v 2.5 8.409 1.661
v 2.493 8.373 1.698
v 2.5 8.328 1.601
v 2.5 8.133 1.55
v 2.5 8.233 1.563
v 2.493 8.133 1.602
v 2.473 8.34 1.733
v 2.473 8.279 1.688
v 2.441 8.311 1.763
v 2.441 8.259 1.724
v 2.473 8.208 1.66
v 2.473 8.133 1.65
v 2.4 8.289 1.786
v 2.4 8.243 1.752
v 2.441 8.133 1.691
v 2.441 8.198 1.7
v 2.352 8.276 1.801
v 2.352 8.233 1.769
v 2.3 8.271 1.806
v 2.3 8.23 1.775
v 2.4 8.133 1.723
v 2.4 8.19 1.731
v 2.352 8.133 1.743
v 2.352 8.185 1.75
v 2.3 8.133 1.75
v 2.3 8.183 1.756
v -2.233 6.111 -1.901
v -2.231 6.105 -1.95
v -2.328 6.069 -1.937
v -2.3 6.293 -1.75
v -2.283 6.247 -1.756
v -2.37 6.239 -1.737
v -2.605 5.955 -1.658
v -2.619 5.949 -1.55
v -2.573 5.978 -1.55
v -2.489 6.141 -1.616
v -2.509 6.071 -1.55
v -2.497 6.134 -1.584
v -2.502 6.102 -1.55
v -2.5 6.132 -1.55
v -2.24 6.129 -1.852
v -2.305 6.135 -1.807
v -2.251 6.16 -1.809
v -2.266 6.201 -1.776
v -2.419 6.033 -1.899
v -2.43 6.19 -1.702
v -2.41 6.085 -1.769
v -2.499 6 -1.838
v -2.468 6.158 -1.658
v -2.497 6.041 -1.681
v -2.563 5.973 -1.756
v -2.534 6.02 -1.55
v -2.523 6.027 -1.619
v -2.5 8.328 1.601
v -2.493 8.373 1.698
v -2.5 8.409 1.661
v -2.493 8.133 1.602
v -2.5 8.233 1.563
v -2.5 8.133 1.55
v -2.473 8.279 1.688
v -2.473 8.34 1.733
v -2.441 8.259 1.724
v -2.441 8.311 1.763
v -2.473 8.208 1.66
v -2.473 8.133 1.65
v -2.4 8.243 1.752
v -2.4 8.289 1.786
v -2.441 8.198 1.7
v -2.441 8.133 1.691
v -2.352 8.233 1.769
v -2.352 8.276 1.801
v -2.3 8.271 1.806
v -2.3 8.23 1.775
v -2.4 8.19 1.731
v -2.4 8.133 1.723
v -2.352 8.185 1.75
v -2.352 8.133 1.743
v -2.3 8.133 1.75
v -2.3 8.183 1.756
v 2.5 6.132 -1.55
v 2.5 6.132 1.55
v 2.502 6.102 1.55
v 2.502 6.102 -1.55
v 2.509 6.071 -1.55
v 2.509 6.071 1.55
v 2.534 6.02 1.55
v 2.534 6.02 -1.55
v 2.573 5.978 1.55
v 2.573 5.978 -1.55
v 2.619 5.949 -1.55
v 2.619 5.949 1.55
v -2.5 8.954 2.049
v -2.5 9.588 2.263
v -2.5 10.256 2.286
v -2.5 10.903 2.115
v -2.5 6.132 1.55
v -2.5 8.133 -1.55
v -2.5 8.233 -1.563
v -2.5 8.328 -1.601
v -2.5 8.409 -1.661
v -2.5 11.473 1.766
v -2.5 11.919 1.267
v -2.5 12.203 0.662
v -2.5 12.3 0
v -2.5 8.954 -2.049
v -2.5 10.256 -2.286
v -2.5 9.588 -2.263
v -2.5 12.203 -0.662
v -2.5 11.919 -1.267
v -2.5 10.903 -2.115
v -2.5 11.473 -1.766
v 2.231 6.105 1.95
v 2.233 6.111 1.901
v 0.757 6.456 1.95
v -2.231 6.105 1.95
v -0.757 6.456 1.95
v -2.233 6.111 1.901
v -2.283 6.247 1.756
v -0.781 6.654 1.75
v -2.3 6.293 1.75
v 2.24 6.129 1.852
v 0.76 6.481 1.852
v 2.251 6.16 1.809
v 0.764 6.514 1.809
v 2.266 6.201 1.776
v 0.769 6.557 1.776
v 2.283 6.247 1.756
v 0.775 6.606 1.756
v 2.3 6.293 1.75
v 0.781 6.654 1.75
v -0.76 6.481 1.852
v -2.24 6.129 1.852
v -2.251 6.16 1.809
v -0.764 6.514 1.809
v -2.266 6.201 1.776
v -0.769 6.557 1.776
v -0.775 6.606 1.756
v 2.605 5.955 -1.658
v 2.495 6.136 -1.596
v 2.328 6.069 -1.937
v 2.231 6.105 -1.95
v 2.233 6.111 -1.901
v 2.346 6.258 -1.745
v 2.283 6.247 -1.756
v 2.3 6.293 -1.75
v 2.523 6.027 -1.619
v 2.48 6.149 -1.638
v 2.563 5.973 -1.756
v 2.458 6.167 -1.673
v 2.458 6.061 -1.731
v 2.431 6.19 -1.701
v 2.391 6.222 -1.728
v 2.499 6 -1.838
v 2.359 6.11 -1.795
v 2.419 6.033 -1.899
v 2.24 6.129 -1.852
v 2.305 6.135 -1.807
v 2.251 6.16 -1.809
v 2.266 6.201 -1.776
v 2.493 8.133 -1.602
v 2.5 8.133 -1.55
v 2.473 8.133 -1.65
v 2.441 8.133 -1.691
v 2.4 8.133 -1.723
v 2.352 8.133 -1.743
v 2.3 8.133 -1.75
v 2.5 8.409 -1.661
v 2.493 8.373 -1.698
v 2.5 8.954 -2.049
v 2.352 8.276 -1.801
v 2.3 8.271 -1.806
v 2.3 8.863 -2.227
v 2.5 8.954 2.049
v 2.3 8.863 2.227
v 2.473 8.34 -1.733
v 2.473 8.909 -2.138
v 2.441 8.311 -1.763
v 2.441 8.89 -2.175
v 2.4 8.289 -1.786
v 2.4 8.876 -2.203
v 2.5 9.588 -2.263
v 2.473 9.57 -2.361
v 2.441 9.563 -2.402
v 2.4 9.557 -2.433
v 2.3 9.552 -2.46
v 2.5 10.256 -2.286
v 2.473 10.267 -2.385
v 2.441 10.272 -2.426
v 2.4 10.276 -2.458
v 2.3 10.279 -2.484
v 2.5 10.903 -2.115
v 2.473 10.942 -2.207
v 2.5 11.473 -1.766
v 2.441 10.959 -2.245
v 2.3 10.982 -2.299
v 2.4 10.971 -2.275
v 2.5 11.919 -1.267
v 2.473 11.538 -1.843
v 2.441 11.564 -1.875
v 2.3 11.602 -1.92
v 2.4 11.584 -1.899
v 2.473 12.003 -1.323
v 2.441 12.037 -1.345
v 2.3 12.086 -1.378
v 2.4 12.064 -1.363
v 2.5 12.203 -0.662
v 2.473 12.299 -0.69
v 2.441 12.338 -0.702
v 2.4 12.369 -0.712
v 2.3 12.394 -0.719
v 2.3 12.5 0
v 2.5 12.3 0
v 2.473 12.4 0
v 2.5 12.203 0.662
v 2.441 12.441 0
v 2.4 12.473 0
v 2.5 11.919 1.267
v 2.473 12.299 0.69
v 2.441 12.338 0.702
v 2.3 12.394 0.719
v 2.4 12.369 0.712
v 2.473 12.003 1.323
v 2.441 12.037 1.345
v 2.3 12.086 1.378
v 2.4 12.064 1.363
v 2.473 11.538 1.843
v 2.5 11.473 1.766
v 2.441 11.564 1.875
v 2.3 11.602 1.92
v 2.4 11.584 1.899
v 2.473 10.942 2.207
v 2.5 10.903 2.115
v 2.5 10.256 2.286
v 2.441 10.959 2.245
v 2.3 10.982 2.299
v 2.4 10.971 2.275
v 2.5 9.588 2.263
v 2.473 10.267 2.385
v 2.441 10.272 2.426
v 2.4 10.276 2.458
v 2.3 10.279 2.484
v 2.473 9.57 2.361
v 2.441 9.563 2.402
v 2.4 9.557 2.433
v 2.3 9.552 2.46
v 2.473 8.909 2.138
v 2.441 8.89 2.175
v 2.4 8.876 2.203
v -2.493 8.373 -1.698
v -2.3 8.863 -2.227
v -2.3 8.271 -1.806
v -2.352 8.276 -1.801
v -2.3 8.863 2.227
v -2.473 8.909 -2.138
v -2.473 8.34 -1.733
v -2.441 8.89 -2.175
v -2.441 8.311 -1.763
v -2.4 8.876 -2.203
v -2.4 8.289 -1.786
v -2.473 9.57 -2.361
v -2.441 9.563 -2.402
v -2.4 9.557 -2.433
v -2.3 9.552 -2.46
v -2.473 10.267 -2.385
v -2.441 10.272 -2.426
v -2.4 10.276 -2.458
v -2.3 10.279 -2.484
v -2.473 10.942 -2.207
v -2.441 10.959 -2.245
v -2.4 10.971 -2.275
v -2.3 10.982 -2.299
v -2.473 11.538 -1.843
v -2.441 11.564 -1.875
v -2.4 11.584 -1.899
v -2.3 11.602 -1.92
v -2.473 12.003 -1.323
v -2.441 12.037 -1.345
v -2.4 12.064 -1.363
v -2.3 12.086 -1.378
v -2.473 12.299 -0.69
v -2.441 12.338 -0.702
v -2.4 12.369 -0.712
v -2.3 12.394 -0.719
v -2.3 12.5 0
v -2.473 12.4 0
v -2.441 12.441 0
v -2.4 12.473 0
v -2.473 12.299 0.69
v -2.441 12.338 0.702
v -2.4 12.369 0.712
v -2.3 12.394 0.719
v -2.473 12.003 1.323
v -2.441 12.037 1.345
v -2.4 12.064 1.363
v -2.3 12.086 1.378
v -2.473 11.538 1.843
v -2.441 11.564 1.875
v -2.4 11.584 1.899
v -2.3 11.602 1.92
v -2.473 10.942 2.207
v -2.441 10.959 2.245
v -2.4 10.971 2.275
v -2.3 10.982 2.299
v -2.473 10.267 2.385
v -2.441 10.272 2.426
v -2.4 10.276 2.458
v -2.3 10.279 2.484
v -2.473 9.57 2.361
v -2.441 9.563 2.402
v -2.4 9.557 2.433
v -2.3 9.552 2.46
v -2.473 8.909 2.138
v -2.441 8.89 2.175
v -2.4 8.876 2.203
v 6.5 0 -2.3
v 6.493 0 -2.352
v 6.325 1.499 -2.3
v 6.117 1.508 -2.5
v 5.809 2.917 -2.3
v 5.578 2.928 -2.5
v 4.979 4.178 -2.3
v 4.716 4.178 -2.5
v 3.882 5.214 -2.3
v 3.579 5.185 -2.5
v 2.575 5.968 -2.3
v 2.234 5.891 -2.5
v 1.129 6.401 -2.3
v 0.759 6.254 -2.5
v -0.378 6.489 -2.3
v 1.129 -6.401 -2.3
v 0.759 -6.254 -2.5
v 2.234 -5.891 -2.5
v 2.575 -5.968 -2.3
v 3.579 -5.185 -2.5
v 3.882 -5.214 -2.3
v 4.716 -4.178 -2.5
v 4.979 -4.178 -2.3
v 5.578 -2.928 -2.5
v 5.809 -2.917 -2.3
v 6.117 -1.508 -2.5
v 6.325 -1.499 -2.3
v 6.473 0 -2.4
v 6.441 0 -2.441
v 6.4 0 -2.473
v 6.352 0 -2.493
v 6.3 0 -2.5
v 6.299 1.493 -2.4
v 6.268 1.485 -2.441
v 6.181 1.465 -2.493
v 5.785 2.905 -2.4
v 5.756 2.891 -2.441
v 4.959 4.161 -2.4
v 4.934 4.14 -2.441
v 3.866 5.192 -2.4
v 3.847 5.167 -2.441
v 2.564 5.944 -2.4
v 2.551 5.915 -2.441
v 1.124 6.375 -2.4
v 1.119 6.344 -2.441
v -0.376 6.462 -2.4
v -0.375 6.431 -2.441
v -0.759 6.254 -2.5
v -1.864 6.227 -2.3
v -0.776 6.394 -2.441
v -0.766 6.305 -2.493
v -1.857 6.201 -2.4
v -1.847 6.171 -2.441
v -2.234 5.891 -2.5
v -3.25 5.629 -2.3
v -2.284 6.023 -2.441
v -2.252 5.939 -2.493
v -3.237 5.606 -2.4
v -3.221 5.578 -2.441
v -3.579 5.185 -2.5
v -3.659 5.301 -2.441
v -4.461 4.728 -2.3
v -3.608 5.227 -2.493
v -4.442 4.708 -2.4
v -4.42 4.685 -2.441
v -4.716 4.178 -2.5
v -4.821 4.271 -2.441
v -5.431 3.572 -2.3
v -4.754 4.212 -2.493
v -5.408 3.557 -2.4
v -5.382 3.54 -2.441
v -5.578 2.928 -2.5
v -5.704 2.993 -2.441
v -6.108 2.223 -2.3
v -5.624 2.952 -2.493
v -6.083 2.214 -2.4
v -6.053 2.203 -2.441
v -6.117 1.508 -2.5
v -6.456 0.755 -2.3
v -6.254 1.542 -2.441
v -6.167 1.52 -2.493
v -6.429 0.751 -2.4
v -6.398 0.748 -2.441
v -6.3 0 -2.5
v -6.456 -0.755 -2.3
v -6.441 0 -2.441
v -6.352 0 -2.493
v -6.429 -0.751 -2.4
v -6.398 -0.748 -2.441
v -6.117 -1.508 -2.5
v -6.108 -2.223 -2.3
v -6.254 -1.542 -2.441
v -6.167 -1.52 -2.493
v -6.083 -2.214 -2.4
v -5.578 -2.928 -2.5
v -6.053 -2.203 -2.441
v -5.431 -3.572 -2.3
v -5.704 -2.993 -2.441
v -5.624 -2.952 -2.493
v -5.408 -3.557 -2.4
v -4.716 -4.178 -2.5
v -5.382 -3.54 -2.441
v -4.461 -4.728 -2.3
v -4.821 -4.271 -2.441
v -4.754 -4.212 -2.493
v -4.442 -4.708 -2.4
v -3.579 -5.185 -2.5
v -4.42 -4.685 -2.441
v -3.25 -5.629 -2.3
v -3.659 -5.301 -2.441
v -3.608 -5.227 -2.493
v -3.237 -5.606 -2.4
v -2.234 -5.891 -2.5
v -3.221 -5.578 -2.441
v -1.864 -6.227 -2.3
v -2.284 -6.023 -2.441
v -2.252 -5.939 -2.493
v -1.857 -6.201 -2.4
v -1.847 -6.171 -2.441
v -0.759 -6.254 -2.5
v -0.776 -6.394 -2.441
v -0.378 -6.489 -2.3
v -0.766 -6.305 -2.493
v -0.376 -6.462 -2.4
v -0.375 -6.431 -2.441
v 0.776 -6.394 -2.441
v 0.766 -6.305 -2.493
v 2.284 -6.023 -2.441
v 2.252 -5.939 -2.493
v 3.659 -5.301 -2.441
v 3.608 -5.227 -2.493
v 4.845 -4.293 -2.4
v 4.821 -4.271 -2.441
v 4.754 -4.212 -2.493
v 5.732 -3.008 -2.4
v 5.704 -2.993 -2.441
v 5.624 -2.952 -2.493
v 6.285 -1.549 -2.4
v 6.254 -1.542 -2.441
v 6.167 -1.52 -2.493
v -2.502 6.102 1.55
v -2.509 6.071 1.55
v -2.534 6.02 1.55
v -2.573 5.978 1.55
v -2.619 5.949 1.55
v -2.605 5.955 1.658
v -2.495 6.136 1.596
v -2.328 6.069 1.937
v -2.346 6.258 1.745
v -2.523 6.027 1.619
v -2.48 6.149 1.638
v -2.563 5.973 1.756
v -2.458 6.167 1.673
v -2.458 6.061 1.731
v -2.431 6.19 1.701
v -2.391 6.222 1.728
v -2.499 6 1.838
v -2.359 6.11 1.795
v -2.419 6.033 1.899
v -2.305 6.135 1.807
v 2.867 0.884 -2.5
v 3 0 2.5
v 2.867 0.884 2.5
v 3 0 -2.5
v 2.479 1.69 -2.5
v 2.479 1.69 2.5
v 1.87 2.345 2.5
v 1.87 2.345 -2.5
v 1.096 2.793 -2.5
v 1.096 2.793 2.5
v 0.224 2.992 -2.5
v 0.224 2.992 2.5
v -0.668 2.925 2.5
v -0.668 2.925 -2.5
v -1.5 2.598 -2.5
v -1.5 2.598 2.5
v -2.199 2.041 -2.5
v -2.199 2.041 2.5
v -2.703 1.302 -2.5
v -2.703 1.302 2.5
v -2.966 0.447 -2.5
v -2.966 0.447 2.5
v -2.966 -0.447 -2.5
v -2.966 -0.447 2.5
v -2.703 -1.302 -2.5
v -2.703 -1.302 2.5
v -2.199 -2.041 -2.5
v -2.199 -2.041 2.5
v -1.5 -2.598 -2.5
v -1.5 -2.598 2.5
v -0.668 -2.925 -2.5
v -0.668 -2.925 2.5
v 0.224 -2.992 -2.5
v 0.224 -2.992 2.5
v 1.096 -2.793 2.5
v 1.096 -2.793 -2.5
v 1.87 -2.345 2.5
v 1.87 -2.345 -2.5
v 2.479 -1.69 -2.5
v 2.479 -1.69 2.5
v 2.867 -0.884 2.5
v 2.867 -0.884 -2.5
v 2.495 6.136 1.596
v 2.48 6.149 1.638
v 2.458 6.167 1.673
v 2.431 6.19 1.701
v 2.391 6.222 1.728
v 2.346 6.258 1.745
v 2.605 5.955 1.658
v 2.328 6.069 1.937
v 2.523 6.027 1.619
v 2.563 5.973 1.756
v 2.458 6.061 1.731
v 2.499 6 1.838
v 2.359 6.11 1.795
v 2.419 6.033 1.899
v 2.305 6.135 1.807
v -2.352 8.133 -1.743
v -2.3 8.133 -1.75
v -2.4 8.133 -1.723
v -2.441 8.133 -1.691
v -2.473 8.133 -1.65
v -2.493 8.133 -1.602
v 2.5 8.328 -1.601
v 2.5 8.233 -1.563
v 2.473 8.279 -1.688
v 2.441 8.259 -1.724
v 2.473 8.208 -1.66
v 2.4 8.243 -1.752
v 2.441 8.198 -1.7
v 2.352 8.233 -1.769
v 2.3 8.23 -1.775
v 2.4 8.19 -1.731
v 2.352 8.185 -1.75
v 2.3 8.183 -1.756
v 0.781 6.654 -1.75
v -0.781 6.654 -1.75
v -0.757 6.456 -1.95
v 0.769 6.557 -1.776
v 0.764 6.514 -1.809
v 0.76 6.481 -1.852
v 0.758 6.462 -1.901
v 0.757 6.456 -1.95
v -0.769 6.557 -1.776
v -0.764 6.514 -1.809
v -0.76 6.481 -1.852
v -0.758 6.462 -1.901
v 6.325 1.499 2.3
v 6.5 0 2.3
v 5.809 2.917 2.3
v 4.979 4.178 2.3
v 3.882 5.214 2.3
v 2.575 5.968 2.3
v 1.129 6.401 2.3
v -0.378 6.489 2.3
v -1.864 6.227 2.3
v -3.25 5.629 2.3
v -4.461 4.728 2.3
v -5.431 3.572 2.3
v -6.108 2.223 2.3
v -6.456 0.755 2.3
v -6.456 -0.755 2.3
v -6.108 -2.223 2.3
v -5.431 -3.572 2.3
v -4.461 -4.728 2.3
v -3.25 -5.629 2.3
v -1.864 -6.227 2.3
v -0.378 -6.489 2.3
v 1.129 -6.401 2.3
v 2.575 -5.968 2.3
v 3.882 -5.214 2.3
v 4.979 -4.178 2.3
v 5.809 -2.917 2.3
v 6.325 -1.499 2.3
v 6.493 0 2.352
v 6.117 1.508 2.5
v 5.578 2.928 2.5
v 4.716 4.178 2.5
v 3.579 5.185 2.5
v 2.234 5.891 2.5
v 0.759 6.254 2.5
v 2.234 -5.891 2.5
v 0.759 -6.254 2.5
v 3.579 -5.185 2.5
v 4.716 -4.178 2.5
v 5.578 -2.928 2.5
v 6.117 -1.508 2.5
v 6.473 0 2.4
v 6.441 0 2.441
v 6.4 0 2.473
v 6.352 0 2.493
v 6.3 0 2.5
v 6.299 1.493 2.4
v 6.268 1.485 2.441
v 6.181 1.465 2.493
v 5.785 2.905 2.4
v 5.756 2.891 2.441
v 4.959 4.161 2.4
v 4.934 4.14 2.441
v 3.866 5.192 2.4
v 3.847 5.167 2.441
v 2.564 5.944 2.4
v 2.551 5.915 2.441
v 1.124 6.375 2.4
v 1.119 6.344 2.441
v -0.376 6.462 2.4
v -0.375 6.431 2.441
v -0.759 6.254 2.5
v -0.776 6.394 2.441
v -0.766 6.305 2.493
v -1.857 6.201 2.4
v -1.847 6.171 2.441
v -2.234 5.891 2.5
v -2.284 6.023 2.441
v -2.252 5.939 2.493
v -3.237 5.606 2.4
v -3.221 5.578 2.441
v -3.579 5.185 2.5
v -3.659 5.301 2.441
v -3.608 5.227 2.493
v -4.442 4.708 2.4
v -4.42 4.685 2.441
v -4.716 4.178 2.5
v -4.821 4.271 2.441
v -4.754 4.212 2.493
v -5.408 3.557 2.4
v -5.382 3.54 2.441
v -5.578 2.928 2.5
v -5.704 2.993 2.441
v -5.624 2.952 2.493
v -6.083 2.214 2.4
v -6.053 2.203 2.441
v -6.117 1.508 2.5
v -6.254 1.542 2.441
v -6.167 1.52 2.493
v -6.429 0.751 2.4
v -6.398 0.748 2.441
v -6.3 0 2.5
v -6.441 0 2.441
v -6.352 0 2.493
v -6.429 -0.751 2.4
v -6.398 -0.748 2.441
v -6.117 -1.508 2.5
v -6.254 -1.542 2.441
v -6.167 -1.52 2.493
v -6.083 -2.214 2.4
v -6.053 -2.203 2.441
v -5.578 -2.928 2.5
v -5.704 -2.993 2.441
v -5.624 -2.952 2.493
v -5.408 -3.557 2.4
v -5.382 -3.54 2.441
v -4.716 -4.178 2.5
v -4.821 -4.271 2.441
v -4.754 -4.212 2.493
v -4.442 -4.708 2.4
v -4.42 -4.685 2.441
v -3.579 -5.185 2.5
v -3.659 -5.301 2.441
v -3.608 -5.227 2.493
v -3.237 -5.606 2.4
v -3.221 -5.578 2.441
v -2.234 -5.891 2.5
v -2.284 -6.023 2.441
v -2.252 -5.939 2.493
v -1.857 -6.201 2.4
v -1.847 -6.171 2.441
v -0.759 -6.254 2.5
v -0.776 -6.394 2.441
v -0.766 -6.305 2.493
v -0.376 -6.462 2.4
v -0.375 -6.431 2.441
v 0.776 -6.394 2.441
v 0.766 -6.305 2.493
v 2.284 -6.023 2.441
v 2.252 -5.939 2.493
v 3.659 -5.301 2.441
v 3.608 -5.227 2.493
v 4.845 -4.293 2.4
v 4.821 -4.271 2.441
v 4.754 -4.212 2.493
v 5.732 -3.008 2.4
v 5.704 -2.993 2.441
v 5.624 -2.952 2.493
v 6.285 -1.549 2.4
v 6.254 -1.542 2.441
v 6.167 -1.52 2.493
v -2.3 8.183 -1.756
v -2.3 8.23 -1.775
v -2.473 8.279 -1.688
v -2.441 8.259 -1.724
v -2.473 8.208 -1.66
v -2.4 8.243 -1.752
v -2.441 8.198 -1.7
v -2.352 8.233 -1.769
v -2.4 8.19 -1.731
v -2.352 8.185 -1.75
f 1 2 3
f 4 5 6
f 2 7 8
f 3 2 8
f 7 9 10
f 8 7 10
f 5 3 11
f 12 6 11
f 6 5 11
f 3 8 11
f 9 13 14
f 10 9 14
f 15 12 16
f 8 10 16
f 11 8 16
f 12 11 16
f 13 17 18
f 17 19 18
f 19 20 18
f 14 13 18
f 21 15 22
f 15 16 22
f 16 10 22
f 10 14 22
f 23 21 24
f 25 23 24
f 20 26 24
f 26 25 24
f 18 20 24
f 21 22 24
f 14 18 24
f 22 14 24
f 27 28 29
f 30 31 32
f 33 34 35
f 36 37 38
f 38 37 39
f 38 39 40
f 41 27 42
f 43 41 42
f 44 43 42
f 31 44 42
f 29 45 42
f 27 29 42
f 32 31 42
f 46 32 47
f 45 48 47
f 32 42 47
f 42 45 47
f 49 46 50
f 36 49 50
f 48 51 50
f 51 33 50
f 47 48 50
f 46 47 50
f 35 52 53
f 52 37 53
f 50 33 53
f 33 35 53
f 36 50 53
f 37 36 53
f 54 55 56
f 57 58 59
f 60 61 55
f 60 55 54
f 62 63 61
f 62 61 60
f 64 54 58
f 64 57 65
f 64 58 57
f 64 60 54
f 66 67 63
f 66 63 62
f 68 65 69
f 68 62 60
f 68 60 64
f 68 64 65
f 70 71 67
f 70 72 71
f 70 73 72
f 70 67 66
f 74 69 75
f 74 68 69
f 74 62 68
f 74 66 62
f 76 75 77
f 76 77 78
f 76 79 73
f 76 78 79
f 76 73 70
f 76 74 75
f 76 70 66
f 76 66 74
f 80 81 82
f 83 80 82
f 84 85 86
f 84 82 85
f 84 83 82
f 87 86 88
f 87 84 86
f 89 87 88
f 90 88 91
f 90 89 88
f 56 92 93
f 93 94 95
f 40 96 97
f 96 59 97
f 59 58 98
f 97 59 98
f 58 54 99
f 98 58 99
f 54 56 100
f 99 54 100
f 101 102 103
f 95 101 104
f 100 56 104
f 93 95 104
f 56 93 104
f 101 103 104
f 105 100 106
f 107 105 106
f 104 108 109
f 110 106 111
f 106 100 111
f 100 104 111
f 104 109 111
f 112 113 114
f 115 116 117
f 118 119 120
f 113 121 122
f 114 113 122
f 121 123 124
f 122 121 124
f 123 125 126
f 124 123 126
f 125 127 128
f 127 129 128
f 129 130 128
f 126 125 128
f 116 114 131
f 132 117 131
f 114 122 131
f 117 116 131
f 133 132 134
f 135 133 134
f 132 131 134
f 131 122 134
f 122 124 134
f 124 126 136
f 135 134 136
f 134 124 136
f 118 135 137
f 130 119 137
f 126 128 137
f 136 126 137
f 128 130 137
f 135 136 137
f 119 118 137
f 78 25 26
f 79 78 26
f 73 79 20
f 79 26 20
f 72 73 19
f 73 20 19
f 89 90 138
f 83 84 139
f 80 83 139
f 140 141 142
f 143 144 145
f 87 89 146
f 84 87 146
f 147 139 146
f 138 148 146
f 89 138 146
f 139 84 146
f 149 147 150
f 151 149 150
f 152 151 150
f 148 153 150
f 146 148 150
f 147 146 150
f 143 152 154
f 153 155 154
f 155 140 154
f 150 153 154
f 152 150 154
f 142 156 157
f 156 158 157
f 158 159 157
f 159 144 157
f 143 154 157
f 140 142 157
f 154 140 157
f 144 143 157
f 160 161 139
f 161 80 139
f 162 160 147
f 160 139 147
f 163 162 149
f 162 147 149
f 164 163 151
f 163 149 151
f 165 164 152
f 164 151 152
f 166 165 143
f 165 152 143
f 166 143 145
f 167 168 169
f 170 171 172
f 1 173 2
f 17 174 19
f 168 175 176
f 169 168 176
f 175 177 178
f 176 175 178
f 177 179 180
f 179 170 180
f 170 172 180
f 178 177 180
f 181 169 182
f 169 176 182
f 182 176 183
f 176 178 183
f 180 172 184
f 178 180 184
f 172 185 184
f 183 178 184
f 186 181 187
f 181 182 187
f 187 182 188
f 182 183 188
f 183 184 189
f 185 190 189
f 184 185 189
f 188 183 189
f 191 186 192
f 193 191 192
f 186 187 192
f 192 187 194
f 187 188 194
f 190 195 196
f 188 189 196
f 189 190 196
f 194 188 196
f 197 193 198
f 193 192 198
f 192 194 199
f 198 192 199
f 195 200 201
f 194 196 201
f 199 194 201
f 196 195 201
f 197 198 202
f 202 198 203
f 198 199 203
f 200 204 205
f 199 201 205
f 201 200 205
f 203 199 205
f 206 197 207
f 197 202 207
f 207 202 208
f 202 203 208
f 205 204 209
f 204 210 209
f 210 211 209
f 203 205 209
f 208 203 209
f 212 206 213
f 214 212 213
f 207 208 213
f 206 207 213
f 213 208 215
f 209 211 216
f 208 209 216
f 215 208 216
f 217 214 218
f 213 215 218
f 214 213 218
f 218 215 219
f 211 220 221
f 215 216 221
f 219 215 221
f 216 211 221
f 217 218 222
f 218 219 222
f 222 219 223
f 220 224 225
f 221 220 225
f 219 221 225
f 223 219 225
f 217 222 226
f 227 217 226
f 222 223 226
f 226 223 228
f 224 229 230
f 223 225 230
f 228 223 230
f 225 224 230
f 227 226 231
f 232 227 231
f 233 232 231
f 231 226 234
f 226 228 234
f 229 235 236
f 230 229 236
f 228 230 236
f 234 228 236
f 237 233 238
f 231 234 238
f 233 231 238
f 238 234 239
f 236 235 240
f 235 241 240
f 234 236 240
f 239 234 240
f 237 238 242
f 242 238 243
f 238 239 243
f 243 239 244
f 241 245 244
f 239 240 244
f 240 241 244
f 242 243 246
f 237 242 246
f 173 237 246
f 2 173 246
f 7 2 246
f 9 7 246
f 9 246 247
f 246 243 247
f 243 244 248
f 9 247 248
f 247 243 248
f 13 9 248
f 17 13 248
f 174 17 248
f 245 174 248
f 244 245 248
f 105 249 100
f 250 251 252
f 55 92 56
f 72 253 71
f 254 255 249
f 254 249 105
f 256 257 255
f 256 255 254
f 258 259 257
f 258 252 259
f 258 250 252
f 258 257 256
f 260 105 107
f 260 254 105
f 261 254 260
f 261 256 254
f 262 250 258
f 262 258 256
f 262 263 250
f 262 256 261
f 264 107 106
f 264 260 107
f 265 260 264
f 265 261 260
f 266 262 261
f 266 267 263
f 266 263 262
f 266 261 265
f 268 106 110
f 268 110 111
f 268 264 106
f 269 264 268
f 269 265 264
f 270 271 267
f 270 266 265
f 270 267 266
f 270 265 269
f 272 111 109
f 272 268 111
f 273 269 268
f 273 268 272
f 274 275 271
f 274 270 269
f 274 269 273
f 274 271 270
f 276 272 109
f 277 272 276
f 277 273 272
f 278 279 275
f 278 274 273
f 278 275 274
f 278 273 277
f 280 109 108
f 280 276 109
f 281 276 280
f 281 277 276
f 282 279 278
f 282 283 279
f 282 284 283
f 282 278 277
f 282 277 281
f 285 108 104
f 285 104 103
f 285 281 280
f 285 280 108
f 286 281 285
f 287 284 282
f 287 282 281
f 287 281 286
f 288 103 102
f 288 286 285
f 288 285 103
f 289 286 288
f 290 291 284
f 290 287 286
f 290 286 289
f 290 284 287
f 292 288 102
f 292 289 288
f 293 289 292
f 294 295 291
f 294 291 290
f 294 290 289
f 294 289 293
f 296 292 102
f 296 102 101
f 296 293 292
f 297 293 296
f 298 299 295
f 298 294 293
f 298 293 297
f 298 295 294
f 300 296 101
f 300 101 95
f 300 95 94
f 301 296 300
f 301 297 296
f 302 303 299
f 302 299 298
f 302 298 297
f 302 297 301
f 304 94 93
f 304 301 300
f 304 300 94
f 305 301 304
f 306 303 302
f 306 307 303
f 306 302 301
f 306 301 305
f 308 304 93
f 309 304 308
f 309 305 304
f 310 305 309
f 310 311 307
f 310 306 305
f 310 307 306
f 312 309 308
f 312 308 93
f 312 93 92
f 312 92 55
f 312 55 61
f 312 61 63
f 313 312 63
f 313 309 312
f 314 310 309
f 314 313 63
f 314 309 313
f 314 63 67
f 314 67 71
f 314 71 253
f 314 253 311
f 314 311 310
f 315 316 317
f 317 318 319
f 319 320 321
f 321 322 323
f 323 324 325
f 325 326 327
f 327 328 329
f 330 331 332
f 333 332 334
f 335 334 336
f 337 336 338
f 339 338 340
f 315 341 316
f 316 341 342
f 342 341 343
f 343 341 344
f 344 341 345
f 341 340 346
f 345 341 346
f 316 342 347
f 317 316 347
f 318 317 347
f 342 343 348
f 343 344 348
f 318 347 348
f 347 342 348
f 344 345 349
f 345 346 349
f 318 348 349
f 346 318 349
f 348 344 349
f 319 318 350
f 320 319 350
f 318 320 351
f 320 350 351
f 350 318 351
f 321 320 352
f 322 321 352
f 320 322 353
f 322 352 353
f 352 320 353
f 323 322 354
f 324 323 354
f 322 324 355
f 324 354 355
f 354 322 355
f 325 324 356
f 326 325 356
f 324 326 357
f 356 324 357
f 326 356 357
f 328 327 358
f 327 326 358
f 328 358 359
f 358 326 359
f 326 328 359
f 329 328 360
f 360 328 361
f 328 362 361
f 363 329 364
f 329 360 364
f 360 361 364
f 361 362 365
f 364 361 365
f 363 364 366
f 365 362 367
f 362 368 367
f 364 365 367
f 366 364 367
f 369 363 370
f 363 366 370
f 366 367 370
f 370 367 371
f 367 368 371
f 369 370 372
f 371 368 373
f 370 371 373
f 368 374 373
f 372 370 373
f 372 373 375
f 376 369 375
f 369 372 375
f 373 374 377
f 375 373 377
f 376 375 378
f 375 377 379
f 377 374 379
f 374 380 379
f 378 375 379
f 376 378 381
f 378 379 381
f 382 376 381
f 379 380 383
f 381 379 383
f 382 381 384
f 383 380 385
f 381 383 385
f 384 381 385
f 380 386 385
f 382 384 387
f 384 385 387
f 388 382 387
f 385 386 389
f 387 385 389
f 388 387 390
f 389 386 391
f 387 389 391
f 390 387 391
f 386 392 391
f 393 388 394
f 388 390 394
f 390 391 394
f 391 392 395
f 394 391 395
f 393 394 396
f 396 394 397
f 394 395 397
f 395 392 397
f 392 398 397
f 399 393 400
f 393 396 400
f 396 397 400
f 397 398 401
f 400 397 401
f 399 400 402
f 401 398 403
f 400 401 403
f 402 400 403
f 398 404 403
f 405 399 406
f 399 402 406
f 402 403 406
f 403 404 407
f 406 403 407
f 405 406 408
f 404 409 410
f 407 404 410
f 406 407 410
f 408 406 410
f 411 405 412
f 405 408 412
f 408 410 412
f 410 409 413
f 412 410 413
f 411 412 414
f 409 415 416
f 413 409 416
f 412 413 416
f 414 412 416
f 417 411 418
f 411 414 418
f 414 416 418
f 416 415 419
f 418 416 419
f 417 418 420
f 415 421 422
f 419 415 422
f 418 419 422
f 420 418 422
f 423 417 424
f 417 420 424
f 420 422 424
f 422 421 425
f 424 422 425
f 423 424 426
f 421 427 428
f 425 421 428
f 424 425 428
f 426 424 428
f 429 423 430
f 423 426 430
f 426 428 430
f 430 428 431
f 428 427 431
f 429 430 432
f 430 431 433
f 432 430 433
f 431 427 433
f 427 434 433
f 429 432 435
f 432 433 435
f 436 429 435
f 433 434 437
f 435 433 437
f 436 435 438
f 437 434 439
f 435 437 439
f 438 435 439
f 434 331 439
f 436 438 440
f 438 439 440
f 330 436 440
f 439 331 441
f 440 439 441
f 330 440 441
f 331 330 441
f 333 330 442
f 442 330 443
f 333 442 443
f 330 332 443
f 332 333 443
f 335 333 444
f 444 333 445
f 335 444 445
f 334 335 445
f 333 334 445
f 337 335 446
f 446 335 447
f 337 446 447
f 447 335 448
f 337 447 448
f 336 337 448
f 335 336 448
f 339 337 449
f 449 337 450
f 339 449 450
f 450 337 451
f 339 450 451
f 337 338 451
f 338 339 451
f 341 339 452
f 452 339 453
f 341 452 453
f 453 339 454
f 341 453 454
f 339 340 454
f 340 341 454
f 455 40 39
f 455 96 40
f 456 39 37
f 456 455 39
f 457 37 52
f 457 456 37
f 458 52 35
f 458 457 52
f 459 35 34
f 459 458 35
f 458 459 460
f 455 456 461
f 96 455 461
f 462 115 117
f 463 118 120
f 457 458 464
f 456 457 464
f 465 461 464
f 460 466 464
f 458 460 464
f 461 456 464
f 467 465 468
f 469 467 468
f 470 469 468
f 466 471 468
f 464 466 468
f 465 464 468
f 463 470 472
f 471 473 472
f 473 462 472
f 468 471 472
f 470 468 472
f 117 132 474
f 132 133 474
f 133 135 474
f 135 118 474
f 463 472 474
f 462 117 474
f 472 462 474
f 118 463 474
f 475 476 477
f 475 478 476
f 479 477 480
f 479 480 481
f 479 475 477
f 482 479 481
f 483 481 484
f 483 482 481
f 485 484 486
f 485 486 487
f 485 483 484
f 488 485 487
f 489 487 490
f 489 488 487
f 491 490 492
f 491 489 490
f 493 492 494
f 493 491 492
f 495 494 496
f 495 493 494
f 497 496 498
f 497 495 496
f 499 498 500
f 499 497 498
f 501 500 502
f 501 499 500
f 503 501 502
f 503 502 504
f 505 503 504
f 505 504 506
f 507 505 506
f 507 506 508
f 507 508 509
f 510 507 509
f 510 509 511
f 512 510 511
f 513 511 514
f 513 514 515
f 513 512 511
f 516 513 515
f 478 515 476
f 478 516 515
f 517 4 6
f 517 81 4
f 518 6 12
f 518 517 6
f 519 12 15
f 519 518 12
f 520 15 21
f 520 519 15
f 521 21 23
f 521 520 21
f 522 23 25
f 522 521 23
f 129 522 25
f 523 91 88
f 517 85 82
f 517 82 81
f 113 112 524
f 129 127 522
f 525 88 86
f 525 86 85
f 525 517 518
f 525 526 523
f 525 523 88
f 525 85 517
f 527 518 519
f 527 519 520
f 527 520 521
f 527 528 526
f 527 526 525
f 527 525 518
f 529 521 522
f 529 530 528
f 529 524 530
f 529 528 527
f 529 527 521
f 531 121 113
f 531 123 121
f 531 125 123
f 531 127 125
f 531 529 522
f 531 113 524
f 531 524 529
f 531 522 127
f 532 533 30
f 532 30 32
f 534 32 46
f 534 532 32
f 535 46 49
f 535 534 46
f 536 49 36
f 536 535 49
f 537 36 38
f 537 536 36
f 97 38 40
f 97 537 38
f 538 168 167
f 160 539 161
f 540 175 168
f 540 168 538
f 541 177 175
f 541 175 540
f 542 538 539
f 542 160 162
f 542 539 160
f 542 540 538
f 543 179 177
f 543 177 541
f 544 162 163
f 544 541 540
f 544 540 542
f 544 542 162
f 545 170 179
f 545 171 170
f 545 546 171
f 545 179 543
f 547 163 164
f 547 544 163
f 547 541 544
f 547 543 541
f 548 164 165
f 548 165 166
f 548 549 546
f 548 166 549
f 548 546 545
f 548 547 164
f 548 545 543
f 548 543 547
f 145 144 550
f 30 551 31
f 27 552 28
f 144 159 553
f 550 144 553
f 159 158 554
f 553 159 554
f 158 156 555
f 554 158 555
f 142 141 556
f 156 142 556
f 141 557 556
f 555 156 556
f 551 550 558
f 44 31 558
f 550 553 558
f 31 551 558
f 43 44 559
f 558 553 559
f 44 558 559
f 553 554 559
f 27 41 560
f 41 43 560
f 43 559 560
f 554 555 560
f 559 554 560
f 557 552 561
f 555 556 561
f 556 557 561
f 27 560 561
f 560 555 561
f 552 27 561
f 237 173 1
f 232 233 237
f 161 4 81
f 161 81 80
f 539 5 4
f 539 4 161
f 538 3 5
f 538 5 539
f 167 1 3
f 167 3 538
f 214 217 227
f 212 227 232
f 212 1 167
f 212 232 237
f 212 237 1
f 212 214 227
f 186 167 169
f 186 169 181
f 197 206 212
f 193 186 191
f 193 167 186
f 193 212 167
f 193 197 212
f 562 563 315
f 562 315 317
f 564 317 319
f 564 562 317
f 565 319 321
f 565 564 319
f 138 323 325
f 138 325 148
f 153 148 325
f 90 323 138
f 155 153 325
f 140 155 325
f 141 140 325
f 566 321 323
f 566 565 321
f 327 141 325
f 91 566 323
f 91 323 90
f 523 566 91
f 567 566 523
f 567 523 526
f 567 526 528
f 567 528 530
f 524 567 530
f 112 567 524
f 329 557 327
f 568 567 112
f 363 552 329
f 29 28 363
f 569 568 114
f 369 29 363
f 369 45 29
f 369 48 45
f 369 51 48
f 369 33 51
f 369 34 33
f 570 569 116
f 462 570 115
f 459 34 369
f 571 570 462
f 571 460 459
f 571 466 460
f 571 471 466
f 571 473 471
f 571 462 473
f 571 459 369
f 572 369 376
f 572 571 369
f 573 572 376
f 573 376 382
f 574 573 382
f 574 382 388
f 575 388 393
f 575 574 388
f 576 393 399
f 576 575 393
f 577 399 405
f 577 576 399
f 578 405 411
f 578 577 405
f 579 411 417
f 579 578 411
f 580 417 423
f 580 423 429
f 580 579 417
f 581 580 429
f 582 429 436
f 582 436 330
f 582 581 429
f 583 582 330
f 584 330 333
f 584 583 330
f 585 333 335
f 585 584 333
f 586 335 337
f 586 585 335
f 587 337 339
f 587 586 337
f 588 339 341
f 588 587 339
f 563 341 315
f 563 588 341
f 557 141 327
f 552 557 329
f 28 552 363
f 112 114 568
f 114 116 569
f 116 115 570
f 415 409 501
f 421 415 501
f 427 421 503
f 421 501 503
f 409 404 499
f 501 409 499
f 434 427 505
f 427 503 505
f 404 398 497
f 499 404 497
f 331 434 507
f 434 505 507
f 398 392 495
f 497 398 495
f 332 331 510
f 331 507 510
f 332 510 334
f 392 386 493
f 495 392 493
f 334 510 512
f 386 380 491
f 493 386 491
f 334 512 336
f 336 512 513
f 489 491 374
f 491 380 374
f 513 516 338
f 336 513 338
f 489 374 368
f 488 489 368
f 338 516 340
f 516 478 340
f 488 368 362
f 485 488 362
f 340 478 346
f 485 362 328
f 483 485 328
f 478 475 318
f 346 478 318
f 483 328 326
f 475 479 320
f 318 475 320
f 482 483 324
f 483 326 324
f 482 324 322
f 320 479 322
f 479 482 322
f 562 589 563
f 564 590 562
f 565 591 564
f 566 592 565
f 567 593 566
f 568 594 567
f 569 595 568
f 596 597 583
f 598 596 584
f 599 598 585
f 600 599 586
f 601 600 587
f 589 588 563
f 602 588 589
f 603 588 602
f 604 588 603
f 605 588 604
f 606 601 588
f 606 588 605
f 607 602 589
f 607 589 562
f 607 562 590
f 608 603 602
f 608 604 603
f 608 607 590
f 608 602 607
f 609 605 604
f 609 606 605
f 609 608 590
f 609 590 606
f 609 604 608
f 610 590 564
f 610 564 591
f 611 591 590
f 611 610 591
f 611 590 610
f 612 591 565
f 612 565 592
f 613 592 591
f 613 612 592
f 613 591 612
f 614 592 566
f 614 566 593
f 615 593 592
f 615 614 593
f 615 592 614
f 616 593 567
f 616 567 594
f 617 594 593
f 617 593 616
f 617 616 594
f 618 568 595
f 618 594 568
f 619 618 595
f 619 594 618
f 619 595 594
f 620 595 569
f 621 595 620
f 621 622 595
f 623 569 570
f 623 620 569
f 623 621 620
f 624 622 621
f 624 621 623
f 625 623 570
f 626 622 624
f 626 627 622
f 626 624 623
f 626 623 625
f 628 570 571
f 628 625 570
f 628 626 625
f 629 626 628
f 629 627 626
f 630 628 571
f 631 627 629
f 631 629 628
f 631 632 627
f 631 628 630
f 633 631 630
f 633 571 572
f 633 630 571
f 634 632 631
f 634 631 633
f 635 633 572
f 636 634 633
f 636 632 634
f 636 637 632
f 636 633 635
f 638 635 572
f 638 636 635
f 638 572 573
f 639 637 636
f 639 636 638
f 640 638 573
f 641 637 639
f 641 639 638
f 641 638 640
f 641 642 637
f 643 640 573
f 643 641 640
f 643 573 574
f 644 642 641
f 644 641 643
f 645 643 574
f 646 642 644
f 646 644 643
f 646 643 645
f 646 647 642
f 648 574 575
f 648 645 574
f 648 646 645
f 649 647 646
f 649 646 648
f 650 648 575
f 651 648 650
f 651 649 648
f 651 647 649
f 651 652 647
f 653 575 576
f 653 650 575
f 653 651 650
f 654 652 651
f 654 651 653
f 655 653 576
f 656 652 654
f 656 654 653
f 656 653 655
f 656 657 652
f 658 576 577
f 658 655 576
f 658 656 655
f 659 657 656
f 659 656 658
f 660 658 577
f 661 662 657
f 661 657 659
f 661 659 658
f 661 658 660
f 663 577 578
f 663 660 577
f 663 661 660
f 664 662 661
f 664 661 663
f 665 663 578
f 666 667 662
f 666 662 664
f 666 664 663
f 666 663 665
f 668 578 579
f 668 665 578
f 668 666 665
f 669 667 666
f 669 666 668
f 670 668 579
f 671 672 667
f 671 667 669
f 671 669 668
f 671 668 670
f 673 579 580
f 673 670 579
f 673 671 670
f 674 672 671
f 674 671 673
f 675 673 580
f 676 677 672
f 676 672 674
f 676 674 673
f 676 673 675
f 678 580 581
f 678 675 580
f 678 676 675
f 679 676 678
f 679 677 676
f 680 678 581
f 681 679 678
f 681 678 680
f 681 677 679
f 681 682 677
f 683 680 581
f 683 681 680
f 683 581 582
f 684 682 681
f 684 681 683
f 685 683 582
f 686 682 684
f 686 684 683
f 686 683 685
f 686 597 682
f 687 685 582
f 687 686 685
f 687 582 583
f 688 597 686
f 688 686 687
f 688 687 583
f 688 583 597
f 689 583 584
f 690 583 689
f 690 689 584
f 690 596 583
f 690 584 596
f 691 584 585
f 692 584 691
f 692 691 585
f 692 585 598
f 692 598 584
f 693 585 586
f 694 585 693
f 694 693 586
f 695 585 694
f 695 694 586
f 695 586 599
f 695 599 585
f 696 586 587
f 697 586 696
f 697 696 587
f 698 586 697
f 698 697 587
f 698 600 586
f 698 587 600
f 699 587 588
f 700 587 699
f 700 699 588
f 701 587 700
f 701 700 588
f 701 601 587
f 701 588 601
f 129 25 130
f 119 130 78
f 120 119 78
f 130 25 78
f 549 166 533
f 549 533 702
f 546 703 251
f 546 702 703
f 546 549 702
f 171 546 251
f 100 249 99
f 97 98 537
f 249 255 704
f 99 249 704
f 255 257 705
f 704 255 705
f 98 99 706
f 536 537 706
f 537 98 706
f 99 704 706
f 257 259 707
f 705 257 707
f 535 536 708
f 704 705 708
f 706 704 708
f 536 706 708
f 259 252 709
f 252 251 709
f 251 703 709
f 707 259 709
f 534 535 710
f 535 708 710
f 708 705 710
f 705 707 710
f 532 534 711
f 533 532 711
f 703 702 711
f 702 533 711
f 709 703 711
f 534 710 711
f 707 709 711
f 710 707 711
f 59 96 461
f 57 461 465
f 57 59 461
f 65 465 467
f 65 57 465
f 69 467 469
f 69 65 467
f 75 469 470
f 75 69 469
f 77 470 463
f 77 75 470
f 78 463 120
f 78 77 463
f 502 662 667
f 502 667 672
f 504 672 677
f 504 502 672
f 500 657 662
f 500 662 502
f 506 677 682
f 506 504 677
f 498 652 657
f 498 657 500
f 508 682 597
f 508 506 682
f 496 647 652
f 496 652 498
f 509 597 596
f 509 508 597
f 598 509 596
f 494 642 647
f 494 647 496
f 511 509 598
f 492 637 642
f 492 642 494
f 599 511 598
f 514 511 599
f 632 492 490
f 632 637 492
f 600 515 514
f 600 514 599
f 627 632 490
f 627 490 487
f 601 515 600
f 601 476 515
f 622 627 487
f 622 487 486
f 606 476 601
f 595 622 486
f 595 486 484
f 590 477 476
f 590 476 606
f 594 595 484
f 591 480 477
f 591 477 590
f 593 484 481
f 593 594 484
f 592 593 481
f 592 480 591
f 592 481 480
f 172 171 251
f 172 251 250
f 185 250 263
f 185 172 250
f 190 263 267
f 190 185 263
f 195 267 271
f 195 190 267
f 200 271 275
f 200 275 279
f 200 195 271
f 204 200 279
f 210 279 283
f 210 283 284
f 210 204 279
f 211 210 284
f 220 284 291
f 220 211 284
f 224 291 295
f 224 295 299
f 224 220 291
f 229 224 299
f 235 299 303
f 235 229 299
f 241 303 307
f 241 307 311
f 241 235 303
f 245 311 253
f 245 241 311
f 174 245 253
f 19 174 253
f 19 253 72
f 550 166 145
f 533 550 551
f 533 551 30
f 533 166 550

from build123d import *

# Parameters (mm, degrees)
ESQUISSE1_R      = 6.5
ESQUISSE1_R_2    = 3
EXTRUSION1_DEPTH = 2.5
ESQUISSE2_R      = 2.5
EXTRUSION2_DEPTH = 2.5
EXTRUSION3_DEPTH = 1.75
CONG_1_R         = 0.2


with BuildPart() as part:
    # Esquisse1 → Extrusion1 (new body, symmetric)
    with BuildSketch(Plane.XY):
        Circle(ESQUISSE1_R)
        Circle(ESQUISSE1_R_2, mode=Mode.SUBTRACT)
    extrude(amount=EXTRUSION1_DEPTH, both=True)



with BuildPart() as body_2:
    # Esquisse2 → Extrusion2 (new body, symmetric)
    with BuildSketch(Plane(origin=(0, 0, 0), x_dir=(0, 0, -1), z_dir=(1, 0, 0))):
        with Locations((0, 10)):
            Circle(ESQUISSE2_R)
    extrude(amount=EXTRUSION2_DEPTH, both=True)


with BuildPart() as part_1:
    add(part.part)

    add(body_2.part)  # Extrusion3 merges body 2
    # Esquisse3 → Extrusion3 (add, symmetric)
    with BuildSketch(Plane.XY):
        with BuildLine():
            Line((-2.5, 10), (2.5, 10))
            Line((2.5, 10), (2.5, 6))
            ThreePointArc((2.5, 6), (0, 6.5), (-2.5, 6))
            Line((-2.5, 6), (-2.5, 10))
        make_face()
    extrude(amount=EXTRUSION3_DEPTH, both=True)

    # Congé1
    cong_1_edges = [part_1.edges().sort_by_distance(p)[0] for p in [
        (0, 6.5, -1.75),
        (-2.5, 6, 0),
        (2.5, 7.107321446, -1.75),
        (2.5, 6, 0),
        (0, 6.5, 1.75),
        (2.5, 7.107321446, 1.75),
        (-6.5, 0, -2.5),
        (-2.5, 7.107321446, -1.75),
        (0, 8.214642893, -1.75),
        (-2.5, 7.107321446, 1.75),
        (0, 8.214642893, 1.75),
        (-2.5, 12.5, 0),
        (2.5, 12.5, 0),
        (-6.5, 0, 2.5),
    ]]
    fillet(cong_1_edges, radius=CONG_1_R)


solid = part_1.part
